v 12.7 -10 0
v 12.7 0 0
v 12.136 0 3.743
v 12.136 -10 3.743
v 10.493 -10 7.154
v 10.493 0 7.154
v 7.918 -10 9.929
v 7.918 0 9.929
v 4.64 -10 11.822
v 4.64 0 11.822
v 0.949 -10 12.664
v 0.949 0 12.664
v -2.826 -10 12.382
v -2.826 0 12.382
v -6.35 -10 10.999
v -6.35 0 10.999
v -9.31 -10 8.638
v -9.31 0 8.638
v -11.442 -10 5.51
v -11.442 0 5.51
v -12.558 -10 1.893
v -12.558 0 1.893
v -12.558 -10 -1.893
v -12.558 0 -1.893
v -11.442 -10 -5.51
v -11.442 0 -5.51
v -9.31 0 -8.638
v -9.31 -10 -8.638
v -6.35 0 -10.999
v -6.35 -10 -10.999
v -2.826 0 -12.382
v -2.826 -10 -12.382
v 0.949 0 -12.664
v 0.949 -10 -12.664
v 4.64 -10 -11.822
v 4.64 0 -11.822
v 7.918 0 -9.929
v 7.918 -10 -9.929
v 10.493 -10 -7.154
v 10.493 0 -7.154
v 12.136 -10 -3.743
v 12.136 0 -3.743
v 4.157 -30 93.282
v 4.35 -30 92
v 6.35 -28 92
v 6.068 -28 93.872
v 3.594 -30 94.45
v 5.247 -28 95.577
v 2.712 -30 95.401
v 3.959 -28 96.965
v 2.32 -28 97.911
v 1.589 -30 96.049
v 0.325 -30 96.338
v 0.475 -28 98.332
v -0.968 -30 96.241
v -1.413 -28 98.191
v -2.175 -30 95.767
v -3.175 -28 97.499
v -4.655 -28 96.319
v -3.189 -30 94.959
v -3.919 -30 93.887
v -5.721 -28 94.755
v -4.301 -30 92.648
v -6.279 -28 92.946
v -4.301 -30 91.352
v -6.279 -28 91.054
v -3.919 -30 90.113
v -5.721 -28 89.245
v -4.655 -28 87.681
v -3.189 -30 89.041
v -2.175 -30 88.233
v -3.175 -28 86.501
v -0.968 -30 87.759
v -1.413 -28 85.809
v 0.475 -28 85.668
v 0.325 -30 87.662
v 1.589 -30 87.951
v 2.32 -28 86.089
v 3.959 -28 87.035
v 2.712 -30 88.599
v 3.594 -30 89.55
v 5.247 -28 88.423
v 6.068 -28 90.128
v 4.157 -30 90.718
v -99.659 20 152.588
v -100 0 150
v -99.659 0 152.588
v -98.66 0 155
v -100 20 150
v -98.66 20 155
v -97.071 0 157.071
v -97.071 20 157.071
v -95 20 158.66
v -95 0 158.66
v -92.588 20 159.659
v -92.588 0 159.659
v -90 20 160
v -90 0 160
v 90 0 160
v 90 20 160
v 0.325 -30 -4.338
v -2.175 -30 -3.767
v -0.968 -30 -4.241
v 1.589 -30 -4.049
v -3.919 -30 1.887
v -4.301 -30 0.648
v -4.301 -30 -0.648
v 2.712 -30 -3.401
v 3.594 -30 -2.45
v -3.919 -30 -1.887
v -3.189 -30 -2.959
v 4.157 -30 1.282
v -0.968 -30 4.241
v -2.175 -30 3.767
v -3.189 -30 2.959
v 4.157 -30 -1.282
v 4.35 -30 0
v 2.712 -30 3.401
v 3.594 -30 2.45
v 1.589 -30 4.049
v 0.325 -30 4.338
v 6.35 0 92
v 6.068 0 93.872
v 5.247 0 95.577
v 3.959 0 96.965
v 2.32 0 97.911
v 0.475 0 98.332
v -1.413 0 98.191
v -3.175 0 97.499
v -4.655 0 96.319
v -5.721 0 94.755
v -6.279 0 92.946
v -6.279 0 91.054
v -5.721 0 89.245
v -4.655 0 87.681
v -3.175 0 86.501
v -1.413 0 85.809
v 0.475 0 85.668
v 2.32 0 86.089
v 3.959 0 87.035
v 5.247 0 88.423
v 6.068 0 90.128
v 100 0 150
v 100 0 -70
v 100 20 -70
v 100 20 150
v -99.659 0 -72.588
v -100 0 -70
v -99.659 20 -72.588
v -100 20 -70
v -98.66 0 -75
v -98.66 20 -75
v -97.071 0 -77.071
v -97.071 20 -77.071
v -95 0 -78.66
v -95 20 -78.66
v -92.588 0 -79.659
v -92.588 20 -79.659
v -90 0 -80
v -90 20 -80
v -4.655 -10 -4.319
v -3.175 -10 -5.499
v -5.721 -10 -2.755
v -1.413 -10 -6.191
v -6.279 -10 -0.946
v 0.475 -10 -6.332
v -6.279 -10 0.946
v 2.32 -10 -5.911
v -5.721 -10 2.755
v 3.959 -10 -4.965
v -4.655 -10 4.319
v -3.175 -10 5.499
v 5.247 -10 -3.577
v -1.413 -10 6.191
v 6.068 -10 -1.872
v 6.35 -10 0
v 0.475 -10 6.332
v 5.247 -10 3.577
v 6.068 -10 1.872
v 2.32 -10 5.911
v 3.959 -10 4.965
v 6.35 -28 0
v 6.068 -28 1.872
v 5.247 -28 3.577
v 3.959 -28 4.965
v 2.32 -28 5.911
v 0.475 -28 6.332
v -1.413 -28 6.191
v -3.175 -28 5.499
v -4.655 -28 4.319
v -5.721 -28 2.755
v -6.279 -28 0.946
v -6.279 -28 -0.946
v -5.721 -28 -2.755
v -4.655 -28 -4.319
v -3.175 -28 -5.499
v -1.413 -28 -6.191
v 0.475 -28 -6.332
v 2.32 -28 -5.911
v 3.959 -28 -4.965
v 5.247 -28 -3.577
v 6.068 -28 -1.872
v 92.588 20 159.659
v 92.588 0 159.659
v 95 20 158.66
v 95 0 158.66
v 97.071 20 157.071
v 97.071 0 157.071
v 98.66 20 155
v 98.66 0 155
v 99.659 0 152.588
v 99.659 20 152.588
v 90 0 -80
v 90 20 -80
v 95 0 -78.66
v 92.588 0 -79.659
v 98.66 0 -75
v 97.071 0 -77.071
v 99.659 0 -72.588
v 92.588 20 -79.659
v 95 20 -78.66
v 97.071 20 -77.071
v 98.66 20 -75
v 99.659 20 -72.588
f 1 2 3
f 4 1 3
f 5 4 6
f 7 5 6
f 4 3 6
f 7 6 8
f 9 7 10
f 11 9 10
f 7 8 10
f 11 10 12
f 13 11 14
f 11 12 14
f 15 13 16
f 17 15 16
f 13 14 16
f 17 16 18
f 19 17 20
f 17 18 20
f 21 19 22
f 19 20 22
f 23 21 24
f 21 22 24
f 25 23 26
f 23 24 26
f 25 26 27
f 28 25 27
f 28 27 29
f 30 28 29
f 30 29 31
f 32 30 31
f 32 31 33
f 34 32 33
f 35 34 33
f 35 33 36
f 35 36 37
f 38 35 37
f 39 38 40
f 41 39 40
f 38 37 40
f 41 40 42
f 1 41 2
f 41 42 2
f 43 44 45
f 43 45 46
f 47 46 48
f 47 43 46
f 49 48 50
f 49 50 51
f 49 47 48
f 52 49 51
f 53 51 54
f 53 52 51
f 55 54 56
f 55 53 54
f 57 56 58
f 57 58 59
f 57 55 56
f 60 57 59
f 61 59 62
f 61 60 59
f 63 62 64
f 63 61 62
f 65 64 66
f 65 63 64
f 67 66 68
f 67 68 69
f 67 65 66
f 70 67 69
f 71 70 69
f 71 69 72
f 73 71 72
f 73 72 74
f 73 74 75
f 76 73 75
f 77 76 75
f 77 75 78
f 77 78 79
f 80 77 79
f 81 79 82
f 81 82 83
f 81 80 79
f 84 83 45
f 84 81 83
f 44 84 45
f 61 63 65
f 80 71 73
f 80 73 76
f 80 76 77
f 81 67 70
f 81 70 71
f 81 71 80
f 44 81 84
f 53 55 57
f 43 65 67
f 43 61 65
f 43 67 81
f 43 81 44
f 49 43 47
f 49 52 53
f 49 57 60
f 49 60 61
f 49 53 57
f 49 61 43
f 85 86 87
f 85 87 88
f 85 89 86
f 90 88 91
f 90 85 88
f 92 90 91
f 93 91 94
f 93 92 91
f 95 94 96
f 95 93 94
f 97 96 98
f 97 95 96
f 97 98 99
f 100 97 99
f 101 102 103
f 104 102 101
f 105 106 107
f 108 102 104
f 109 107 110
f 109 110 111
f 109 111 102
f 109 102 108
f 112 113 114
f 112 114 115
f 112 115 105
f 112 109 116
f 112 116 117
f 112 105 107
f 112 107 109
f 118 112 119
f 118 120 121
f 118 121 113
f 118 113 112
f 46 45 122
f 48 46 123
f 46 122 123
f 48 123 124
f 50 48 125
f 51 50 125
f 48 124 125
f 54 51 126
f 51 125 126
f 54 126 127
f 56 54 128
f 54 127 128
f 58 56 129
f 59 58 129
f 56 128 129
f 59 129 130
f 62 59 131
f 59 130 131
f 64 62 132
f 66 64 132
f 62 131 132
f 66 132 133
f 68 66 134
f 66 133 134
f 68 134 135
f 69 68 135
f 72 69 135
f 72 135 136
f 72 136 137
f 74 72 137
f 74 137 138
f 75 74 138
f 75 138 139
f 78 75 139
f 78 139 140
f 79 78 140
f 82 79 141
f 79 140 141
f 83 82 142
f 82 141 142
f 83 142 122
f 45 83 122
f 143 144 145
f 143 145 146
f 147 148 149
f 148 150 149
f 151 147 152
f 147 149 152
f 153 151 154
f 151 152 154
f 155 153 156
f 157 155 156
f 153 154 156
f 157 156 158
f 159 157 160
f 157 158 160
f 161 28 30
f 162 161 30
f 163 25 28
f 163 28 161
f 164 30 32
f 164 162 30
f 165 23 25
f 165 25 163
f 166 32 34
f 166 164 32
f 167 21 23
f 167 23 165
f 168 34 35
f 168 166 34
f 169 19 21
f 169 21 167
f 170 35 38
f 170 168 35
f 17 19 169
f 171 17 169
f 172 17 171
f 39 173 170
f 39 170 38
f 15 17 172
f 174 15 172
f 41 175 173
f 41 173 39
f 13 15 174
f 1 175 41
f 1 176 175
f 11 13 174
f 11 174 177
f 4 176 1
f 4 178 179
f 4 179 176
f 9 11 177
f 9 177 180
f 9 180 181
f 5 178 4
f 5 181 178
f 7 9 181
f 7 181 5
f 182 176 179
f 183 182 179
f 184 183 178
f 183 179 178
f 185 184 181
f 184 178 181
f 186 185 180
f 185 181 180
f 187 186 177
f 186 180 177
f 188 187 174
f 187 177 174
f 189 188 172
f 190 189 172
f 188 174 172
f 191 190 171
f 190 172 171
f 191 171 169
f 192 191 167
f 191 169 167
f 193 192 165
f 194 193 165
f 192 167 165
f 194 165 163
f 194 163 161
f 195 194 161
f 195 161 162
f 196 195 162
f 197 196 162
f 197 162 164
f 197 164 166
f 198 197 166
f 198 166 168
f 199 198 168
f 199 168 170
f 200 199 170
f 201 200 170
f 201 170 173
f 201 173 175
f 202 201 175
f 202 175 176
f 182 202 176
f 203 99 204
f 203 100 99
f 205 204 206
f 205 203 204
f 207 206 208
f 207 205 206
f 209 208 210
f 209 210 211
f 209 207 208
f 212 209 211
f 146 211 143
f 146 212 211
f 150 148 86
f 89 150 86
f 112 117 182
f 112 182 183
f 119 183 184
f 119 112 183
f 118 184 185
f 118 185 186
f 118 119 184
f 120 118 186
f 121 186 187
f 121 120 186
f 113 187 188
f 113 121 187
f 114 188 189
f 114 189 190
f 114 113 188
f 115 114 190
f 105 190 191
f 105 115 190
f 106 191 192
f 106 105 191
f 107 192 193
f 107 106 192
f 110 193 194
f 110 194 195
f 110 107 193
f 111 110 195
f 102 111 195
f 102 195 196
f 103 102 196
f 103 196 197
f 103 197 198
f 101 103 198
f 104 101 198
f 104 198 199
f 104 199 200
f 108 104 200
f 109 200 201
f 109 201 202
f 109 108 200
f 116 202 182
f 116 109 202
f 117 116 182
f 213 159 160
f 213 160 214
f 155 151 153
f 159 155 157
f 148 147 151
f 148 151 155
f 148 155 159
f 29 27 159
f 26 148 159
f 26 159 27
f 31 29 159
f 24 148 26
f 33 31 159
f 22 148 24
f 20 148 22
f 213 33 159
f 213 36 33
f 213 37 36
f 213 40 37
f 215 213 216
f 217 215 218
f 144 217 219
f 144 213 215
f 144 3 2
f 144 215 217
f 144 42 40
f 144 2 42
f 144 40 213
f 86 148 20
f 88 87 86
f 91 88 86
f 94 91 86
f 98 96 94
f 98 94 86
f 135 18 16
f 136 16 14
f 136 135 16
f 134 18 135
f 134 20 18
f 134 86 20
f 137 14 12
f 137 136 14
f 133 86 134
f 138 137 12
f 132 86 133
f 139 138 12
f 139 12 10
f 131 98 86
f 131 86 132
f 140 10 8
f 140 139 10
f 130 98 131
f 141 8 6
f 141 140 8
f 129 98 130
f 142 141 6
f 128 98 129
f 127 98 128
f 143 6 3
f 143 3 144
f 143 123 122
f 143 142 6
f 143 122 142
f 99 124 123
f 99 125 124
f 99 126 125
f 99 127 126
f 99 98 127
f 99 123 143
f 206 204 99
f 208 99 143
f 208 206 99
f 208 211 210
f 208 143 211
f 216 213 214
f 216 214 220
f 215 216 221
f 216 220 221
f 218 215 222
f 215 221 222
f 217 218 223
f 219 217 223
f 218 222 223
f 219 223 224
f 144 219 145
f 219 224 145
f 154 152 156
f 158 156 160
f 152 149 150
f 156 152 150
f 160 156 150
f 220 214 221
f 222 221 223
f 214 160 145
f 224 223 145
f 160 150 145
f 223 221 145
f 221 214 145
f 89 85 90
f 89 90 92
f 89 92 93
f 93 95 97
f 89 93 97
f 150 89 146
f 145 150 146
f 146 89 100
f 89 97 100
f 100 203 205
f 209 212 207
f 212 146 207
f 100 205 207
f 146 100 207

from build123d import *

# Parameters (mm, degrees)
F1_W     = 200
F1_H     = 240
F2_DEPTH = 20
F3_R     = 6.35
F4_DEPTH = 30
F5_SIZE  = 2
F6_R     = 10
F7_R     = 12.7
F8_DEPTH = 10


with BuildPart() as f2:
    # F1 (on Front) → F2 (new body)
    with BuildSketch(Plane.XZ):
        with Locations((0, 40)):
            Rectangle(F1_W, F1_H)
    extrude(amount=-F2_DEPTH)

    # F3 (on Front) → F4 (join)
    with BuildSketch(Plane.XZ):
        with Locations((0, 92)):
            Circle(F3_R)
        Circle(F3_R)
    extrude(amount=F4_DEPTH)

    # F5
    f5_edges = [f2.edges().sort_by_distance(p)[0] for p in [
        (-6.35, -30, 92),
        (-6.35, -30, 0),
    ]]
    chamfer(f5_edges, length=F5_SIZE)

    # F6
    f6_edges = [f2.edges().sort_by_distance(p)[0] for p in [
        (-100, 10, 160),
        (-100, 10, -80),
        (100, 10, -80),
        (100, 10, 160),
    ]]
    fillet(f6_edges, radius=F6_R)

    # F7 (on face) → F8 (join)
    with BuildSketch(Plane.XZ):
        Circle(F7_R)
    extrude(amount=F8_DEPTH)


solid = f2.part
